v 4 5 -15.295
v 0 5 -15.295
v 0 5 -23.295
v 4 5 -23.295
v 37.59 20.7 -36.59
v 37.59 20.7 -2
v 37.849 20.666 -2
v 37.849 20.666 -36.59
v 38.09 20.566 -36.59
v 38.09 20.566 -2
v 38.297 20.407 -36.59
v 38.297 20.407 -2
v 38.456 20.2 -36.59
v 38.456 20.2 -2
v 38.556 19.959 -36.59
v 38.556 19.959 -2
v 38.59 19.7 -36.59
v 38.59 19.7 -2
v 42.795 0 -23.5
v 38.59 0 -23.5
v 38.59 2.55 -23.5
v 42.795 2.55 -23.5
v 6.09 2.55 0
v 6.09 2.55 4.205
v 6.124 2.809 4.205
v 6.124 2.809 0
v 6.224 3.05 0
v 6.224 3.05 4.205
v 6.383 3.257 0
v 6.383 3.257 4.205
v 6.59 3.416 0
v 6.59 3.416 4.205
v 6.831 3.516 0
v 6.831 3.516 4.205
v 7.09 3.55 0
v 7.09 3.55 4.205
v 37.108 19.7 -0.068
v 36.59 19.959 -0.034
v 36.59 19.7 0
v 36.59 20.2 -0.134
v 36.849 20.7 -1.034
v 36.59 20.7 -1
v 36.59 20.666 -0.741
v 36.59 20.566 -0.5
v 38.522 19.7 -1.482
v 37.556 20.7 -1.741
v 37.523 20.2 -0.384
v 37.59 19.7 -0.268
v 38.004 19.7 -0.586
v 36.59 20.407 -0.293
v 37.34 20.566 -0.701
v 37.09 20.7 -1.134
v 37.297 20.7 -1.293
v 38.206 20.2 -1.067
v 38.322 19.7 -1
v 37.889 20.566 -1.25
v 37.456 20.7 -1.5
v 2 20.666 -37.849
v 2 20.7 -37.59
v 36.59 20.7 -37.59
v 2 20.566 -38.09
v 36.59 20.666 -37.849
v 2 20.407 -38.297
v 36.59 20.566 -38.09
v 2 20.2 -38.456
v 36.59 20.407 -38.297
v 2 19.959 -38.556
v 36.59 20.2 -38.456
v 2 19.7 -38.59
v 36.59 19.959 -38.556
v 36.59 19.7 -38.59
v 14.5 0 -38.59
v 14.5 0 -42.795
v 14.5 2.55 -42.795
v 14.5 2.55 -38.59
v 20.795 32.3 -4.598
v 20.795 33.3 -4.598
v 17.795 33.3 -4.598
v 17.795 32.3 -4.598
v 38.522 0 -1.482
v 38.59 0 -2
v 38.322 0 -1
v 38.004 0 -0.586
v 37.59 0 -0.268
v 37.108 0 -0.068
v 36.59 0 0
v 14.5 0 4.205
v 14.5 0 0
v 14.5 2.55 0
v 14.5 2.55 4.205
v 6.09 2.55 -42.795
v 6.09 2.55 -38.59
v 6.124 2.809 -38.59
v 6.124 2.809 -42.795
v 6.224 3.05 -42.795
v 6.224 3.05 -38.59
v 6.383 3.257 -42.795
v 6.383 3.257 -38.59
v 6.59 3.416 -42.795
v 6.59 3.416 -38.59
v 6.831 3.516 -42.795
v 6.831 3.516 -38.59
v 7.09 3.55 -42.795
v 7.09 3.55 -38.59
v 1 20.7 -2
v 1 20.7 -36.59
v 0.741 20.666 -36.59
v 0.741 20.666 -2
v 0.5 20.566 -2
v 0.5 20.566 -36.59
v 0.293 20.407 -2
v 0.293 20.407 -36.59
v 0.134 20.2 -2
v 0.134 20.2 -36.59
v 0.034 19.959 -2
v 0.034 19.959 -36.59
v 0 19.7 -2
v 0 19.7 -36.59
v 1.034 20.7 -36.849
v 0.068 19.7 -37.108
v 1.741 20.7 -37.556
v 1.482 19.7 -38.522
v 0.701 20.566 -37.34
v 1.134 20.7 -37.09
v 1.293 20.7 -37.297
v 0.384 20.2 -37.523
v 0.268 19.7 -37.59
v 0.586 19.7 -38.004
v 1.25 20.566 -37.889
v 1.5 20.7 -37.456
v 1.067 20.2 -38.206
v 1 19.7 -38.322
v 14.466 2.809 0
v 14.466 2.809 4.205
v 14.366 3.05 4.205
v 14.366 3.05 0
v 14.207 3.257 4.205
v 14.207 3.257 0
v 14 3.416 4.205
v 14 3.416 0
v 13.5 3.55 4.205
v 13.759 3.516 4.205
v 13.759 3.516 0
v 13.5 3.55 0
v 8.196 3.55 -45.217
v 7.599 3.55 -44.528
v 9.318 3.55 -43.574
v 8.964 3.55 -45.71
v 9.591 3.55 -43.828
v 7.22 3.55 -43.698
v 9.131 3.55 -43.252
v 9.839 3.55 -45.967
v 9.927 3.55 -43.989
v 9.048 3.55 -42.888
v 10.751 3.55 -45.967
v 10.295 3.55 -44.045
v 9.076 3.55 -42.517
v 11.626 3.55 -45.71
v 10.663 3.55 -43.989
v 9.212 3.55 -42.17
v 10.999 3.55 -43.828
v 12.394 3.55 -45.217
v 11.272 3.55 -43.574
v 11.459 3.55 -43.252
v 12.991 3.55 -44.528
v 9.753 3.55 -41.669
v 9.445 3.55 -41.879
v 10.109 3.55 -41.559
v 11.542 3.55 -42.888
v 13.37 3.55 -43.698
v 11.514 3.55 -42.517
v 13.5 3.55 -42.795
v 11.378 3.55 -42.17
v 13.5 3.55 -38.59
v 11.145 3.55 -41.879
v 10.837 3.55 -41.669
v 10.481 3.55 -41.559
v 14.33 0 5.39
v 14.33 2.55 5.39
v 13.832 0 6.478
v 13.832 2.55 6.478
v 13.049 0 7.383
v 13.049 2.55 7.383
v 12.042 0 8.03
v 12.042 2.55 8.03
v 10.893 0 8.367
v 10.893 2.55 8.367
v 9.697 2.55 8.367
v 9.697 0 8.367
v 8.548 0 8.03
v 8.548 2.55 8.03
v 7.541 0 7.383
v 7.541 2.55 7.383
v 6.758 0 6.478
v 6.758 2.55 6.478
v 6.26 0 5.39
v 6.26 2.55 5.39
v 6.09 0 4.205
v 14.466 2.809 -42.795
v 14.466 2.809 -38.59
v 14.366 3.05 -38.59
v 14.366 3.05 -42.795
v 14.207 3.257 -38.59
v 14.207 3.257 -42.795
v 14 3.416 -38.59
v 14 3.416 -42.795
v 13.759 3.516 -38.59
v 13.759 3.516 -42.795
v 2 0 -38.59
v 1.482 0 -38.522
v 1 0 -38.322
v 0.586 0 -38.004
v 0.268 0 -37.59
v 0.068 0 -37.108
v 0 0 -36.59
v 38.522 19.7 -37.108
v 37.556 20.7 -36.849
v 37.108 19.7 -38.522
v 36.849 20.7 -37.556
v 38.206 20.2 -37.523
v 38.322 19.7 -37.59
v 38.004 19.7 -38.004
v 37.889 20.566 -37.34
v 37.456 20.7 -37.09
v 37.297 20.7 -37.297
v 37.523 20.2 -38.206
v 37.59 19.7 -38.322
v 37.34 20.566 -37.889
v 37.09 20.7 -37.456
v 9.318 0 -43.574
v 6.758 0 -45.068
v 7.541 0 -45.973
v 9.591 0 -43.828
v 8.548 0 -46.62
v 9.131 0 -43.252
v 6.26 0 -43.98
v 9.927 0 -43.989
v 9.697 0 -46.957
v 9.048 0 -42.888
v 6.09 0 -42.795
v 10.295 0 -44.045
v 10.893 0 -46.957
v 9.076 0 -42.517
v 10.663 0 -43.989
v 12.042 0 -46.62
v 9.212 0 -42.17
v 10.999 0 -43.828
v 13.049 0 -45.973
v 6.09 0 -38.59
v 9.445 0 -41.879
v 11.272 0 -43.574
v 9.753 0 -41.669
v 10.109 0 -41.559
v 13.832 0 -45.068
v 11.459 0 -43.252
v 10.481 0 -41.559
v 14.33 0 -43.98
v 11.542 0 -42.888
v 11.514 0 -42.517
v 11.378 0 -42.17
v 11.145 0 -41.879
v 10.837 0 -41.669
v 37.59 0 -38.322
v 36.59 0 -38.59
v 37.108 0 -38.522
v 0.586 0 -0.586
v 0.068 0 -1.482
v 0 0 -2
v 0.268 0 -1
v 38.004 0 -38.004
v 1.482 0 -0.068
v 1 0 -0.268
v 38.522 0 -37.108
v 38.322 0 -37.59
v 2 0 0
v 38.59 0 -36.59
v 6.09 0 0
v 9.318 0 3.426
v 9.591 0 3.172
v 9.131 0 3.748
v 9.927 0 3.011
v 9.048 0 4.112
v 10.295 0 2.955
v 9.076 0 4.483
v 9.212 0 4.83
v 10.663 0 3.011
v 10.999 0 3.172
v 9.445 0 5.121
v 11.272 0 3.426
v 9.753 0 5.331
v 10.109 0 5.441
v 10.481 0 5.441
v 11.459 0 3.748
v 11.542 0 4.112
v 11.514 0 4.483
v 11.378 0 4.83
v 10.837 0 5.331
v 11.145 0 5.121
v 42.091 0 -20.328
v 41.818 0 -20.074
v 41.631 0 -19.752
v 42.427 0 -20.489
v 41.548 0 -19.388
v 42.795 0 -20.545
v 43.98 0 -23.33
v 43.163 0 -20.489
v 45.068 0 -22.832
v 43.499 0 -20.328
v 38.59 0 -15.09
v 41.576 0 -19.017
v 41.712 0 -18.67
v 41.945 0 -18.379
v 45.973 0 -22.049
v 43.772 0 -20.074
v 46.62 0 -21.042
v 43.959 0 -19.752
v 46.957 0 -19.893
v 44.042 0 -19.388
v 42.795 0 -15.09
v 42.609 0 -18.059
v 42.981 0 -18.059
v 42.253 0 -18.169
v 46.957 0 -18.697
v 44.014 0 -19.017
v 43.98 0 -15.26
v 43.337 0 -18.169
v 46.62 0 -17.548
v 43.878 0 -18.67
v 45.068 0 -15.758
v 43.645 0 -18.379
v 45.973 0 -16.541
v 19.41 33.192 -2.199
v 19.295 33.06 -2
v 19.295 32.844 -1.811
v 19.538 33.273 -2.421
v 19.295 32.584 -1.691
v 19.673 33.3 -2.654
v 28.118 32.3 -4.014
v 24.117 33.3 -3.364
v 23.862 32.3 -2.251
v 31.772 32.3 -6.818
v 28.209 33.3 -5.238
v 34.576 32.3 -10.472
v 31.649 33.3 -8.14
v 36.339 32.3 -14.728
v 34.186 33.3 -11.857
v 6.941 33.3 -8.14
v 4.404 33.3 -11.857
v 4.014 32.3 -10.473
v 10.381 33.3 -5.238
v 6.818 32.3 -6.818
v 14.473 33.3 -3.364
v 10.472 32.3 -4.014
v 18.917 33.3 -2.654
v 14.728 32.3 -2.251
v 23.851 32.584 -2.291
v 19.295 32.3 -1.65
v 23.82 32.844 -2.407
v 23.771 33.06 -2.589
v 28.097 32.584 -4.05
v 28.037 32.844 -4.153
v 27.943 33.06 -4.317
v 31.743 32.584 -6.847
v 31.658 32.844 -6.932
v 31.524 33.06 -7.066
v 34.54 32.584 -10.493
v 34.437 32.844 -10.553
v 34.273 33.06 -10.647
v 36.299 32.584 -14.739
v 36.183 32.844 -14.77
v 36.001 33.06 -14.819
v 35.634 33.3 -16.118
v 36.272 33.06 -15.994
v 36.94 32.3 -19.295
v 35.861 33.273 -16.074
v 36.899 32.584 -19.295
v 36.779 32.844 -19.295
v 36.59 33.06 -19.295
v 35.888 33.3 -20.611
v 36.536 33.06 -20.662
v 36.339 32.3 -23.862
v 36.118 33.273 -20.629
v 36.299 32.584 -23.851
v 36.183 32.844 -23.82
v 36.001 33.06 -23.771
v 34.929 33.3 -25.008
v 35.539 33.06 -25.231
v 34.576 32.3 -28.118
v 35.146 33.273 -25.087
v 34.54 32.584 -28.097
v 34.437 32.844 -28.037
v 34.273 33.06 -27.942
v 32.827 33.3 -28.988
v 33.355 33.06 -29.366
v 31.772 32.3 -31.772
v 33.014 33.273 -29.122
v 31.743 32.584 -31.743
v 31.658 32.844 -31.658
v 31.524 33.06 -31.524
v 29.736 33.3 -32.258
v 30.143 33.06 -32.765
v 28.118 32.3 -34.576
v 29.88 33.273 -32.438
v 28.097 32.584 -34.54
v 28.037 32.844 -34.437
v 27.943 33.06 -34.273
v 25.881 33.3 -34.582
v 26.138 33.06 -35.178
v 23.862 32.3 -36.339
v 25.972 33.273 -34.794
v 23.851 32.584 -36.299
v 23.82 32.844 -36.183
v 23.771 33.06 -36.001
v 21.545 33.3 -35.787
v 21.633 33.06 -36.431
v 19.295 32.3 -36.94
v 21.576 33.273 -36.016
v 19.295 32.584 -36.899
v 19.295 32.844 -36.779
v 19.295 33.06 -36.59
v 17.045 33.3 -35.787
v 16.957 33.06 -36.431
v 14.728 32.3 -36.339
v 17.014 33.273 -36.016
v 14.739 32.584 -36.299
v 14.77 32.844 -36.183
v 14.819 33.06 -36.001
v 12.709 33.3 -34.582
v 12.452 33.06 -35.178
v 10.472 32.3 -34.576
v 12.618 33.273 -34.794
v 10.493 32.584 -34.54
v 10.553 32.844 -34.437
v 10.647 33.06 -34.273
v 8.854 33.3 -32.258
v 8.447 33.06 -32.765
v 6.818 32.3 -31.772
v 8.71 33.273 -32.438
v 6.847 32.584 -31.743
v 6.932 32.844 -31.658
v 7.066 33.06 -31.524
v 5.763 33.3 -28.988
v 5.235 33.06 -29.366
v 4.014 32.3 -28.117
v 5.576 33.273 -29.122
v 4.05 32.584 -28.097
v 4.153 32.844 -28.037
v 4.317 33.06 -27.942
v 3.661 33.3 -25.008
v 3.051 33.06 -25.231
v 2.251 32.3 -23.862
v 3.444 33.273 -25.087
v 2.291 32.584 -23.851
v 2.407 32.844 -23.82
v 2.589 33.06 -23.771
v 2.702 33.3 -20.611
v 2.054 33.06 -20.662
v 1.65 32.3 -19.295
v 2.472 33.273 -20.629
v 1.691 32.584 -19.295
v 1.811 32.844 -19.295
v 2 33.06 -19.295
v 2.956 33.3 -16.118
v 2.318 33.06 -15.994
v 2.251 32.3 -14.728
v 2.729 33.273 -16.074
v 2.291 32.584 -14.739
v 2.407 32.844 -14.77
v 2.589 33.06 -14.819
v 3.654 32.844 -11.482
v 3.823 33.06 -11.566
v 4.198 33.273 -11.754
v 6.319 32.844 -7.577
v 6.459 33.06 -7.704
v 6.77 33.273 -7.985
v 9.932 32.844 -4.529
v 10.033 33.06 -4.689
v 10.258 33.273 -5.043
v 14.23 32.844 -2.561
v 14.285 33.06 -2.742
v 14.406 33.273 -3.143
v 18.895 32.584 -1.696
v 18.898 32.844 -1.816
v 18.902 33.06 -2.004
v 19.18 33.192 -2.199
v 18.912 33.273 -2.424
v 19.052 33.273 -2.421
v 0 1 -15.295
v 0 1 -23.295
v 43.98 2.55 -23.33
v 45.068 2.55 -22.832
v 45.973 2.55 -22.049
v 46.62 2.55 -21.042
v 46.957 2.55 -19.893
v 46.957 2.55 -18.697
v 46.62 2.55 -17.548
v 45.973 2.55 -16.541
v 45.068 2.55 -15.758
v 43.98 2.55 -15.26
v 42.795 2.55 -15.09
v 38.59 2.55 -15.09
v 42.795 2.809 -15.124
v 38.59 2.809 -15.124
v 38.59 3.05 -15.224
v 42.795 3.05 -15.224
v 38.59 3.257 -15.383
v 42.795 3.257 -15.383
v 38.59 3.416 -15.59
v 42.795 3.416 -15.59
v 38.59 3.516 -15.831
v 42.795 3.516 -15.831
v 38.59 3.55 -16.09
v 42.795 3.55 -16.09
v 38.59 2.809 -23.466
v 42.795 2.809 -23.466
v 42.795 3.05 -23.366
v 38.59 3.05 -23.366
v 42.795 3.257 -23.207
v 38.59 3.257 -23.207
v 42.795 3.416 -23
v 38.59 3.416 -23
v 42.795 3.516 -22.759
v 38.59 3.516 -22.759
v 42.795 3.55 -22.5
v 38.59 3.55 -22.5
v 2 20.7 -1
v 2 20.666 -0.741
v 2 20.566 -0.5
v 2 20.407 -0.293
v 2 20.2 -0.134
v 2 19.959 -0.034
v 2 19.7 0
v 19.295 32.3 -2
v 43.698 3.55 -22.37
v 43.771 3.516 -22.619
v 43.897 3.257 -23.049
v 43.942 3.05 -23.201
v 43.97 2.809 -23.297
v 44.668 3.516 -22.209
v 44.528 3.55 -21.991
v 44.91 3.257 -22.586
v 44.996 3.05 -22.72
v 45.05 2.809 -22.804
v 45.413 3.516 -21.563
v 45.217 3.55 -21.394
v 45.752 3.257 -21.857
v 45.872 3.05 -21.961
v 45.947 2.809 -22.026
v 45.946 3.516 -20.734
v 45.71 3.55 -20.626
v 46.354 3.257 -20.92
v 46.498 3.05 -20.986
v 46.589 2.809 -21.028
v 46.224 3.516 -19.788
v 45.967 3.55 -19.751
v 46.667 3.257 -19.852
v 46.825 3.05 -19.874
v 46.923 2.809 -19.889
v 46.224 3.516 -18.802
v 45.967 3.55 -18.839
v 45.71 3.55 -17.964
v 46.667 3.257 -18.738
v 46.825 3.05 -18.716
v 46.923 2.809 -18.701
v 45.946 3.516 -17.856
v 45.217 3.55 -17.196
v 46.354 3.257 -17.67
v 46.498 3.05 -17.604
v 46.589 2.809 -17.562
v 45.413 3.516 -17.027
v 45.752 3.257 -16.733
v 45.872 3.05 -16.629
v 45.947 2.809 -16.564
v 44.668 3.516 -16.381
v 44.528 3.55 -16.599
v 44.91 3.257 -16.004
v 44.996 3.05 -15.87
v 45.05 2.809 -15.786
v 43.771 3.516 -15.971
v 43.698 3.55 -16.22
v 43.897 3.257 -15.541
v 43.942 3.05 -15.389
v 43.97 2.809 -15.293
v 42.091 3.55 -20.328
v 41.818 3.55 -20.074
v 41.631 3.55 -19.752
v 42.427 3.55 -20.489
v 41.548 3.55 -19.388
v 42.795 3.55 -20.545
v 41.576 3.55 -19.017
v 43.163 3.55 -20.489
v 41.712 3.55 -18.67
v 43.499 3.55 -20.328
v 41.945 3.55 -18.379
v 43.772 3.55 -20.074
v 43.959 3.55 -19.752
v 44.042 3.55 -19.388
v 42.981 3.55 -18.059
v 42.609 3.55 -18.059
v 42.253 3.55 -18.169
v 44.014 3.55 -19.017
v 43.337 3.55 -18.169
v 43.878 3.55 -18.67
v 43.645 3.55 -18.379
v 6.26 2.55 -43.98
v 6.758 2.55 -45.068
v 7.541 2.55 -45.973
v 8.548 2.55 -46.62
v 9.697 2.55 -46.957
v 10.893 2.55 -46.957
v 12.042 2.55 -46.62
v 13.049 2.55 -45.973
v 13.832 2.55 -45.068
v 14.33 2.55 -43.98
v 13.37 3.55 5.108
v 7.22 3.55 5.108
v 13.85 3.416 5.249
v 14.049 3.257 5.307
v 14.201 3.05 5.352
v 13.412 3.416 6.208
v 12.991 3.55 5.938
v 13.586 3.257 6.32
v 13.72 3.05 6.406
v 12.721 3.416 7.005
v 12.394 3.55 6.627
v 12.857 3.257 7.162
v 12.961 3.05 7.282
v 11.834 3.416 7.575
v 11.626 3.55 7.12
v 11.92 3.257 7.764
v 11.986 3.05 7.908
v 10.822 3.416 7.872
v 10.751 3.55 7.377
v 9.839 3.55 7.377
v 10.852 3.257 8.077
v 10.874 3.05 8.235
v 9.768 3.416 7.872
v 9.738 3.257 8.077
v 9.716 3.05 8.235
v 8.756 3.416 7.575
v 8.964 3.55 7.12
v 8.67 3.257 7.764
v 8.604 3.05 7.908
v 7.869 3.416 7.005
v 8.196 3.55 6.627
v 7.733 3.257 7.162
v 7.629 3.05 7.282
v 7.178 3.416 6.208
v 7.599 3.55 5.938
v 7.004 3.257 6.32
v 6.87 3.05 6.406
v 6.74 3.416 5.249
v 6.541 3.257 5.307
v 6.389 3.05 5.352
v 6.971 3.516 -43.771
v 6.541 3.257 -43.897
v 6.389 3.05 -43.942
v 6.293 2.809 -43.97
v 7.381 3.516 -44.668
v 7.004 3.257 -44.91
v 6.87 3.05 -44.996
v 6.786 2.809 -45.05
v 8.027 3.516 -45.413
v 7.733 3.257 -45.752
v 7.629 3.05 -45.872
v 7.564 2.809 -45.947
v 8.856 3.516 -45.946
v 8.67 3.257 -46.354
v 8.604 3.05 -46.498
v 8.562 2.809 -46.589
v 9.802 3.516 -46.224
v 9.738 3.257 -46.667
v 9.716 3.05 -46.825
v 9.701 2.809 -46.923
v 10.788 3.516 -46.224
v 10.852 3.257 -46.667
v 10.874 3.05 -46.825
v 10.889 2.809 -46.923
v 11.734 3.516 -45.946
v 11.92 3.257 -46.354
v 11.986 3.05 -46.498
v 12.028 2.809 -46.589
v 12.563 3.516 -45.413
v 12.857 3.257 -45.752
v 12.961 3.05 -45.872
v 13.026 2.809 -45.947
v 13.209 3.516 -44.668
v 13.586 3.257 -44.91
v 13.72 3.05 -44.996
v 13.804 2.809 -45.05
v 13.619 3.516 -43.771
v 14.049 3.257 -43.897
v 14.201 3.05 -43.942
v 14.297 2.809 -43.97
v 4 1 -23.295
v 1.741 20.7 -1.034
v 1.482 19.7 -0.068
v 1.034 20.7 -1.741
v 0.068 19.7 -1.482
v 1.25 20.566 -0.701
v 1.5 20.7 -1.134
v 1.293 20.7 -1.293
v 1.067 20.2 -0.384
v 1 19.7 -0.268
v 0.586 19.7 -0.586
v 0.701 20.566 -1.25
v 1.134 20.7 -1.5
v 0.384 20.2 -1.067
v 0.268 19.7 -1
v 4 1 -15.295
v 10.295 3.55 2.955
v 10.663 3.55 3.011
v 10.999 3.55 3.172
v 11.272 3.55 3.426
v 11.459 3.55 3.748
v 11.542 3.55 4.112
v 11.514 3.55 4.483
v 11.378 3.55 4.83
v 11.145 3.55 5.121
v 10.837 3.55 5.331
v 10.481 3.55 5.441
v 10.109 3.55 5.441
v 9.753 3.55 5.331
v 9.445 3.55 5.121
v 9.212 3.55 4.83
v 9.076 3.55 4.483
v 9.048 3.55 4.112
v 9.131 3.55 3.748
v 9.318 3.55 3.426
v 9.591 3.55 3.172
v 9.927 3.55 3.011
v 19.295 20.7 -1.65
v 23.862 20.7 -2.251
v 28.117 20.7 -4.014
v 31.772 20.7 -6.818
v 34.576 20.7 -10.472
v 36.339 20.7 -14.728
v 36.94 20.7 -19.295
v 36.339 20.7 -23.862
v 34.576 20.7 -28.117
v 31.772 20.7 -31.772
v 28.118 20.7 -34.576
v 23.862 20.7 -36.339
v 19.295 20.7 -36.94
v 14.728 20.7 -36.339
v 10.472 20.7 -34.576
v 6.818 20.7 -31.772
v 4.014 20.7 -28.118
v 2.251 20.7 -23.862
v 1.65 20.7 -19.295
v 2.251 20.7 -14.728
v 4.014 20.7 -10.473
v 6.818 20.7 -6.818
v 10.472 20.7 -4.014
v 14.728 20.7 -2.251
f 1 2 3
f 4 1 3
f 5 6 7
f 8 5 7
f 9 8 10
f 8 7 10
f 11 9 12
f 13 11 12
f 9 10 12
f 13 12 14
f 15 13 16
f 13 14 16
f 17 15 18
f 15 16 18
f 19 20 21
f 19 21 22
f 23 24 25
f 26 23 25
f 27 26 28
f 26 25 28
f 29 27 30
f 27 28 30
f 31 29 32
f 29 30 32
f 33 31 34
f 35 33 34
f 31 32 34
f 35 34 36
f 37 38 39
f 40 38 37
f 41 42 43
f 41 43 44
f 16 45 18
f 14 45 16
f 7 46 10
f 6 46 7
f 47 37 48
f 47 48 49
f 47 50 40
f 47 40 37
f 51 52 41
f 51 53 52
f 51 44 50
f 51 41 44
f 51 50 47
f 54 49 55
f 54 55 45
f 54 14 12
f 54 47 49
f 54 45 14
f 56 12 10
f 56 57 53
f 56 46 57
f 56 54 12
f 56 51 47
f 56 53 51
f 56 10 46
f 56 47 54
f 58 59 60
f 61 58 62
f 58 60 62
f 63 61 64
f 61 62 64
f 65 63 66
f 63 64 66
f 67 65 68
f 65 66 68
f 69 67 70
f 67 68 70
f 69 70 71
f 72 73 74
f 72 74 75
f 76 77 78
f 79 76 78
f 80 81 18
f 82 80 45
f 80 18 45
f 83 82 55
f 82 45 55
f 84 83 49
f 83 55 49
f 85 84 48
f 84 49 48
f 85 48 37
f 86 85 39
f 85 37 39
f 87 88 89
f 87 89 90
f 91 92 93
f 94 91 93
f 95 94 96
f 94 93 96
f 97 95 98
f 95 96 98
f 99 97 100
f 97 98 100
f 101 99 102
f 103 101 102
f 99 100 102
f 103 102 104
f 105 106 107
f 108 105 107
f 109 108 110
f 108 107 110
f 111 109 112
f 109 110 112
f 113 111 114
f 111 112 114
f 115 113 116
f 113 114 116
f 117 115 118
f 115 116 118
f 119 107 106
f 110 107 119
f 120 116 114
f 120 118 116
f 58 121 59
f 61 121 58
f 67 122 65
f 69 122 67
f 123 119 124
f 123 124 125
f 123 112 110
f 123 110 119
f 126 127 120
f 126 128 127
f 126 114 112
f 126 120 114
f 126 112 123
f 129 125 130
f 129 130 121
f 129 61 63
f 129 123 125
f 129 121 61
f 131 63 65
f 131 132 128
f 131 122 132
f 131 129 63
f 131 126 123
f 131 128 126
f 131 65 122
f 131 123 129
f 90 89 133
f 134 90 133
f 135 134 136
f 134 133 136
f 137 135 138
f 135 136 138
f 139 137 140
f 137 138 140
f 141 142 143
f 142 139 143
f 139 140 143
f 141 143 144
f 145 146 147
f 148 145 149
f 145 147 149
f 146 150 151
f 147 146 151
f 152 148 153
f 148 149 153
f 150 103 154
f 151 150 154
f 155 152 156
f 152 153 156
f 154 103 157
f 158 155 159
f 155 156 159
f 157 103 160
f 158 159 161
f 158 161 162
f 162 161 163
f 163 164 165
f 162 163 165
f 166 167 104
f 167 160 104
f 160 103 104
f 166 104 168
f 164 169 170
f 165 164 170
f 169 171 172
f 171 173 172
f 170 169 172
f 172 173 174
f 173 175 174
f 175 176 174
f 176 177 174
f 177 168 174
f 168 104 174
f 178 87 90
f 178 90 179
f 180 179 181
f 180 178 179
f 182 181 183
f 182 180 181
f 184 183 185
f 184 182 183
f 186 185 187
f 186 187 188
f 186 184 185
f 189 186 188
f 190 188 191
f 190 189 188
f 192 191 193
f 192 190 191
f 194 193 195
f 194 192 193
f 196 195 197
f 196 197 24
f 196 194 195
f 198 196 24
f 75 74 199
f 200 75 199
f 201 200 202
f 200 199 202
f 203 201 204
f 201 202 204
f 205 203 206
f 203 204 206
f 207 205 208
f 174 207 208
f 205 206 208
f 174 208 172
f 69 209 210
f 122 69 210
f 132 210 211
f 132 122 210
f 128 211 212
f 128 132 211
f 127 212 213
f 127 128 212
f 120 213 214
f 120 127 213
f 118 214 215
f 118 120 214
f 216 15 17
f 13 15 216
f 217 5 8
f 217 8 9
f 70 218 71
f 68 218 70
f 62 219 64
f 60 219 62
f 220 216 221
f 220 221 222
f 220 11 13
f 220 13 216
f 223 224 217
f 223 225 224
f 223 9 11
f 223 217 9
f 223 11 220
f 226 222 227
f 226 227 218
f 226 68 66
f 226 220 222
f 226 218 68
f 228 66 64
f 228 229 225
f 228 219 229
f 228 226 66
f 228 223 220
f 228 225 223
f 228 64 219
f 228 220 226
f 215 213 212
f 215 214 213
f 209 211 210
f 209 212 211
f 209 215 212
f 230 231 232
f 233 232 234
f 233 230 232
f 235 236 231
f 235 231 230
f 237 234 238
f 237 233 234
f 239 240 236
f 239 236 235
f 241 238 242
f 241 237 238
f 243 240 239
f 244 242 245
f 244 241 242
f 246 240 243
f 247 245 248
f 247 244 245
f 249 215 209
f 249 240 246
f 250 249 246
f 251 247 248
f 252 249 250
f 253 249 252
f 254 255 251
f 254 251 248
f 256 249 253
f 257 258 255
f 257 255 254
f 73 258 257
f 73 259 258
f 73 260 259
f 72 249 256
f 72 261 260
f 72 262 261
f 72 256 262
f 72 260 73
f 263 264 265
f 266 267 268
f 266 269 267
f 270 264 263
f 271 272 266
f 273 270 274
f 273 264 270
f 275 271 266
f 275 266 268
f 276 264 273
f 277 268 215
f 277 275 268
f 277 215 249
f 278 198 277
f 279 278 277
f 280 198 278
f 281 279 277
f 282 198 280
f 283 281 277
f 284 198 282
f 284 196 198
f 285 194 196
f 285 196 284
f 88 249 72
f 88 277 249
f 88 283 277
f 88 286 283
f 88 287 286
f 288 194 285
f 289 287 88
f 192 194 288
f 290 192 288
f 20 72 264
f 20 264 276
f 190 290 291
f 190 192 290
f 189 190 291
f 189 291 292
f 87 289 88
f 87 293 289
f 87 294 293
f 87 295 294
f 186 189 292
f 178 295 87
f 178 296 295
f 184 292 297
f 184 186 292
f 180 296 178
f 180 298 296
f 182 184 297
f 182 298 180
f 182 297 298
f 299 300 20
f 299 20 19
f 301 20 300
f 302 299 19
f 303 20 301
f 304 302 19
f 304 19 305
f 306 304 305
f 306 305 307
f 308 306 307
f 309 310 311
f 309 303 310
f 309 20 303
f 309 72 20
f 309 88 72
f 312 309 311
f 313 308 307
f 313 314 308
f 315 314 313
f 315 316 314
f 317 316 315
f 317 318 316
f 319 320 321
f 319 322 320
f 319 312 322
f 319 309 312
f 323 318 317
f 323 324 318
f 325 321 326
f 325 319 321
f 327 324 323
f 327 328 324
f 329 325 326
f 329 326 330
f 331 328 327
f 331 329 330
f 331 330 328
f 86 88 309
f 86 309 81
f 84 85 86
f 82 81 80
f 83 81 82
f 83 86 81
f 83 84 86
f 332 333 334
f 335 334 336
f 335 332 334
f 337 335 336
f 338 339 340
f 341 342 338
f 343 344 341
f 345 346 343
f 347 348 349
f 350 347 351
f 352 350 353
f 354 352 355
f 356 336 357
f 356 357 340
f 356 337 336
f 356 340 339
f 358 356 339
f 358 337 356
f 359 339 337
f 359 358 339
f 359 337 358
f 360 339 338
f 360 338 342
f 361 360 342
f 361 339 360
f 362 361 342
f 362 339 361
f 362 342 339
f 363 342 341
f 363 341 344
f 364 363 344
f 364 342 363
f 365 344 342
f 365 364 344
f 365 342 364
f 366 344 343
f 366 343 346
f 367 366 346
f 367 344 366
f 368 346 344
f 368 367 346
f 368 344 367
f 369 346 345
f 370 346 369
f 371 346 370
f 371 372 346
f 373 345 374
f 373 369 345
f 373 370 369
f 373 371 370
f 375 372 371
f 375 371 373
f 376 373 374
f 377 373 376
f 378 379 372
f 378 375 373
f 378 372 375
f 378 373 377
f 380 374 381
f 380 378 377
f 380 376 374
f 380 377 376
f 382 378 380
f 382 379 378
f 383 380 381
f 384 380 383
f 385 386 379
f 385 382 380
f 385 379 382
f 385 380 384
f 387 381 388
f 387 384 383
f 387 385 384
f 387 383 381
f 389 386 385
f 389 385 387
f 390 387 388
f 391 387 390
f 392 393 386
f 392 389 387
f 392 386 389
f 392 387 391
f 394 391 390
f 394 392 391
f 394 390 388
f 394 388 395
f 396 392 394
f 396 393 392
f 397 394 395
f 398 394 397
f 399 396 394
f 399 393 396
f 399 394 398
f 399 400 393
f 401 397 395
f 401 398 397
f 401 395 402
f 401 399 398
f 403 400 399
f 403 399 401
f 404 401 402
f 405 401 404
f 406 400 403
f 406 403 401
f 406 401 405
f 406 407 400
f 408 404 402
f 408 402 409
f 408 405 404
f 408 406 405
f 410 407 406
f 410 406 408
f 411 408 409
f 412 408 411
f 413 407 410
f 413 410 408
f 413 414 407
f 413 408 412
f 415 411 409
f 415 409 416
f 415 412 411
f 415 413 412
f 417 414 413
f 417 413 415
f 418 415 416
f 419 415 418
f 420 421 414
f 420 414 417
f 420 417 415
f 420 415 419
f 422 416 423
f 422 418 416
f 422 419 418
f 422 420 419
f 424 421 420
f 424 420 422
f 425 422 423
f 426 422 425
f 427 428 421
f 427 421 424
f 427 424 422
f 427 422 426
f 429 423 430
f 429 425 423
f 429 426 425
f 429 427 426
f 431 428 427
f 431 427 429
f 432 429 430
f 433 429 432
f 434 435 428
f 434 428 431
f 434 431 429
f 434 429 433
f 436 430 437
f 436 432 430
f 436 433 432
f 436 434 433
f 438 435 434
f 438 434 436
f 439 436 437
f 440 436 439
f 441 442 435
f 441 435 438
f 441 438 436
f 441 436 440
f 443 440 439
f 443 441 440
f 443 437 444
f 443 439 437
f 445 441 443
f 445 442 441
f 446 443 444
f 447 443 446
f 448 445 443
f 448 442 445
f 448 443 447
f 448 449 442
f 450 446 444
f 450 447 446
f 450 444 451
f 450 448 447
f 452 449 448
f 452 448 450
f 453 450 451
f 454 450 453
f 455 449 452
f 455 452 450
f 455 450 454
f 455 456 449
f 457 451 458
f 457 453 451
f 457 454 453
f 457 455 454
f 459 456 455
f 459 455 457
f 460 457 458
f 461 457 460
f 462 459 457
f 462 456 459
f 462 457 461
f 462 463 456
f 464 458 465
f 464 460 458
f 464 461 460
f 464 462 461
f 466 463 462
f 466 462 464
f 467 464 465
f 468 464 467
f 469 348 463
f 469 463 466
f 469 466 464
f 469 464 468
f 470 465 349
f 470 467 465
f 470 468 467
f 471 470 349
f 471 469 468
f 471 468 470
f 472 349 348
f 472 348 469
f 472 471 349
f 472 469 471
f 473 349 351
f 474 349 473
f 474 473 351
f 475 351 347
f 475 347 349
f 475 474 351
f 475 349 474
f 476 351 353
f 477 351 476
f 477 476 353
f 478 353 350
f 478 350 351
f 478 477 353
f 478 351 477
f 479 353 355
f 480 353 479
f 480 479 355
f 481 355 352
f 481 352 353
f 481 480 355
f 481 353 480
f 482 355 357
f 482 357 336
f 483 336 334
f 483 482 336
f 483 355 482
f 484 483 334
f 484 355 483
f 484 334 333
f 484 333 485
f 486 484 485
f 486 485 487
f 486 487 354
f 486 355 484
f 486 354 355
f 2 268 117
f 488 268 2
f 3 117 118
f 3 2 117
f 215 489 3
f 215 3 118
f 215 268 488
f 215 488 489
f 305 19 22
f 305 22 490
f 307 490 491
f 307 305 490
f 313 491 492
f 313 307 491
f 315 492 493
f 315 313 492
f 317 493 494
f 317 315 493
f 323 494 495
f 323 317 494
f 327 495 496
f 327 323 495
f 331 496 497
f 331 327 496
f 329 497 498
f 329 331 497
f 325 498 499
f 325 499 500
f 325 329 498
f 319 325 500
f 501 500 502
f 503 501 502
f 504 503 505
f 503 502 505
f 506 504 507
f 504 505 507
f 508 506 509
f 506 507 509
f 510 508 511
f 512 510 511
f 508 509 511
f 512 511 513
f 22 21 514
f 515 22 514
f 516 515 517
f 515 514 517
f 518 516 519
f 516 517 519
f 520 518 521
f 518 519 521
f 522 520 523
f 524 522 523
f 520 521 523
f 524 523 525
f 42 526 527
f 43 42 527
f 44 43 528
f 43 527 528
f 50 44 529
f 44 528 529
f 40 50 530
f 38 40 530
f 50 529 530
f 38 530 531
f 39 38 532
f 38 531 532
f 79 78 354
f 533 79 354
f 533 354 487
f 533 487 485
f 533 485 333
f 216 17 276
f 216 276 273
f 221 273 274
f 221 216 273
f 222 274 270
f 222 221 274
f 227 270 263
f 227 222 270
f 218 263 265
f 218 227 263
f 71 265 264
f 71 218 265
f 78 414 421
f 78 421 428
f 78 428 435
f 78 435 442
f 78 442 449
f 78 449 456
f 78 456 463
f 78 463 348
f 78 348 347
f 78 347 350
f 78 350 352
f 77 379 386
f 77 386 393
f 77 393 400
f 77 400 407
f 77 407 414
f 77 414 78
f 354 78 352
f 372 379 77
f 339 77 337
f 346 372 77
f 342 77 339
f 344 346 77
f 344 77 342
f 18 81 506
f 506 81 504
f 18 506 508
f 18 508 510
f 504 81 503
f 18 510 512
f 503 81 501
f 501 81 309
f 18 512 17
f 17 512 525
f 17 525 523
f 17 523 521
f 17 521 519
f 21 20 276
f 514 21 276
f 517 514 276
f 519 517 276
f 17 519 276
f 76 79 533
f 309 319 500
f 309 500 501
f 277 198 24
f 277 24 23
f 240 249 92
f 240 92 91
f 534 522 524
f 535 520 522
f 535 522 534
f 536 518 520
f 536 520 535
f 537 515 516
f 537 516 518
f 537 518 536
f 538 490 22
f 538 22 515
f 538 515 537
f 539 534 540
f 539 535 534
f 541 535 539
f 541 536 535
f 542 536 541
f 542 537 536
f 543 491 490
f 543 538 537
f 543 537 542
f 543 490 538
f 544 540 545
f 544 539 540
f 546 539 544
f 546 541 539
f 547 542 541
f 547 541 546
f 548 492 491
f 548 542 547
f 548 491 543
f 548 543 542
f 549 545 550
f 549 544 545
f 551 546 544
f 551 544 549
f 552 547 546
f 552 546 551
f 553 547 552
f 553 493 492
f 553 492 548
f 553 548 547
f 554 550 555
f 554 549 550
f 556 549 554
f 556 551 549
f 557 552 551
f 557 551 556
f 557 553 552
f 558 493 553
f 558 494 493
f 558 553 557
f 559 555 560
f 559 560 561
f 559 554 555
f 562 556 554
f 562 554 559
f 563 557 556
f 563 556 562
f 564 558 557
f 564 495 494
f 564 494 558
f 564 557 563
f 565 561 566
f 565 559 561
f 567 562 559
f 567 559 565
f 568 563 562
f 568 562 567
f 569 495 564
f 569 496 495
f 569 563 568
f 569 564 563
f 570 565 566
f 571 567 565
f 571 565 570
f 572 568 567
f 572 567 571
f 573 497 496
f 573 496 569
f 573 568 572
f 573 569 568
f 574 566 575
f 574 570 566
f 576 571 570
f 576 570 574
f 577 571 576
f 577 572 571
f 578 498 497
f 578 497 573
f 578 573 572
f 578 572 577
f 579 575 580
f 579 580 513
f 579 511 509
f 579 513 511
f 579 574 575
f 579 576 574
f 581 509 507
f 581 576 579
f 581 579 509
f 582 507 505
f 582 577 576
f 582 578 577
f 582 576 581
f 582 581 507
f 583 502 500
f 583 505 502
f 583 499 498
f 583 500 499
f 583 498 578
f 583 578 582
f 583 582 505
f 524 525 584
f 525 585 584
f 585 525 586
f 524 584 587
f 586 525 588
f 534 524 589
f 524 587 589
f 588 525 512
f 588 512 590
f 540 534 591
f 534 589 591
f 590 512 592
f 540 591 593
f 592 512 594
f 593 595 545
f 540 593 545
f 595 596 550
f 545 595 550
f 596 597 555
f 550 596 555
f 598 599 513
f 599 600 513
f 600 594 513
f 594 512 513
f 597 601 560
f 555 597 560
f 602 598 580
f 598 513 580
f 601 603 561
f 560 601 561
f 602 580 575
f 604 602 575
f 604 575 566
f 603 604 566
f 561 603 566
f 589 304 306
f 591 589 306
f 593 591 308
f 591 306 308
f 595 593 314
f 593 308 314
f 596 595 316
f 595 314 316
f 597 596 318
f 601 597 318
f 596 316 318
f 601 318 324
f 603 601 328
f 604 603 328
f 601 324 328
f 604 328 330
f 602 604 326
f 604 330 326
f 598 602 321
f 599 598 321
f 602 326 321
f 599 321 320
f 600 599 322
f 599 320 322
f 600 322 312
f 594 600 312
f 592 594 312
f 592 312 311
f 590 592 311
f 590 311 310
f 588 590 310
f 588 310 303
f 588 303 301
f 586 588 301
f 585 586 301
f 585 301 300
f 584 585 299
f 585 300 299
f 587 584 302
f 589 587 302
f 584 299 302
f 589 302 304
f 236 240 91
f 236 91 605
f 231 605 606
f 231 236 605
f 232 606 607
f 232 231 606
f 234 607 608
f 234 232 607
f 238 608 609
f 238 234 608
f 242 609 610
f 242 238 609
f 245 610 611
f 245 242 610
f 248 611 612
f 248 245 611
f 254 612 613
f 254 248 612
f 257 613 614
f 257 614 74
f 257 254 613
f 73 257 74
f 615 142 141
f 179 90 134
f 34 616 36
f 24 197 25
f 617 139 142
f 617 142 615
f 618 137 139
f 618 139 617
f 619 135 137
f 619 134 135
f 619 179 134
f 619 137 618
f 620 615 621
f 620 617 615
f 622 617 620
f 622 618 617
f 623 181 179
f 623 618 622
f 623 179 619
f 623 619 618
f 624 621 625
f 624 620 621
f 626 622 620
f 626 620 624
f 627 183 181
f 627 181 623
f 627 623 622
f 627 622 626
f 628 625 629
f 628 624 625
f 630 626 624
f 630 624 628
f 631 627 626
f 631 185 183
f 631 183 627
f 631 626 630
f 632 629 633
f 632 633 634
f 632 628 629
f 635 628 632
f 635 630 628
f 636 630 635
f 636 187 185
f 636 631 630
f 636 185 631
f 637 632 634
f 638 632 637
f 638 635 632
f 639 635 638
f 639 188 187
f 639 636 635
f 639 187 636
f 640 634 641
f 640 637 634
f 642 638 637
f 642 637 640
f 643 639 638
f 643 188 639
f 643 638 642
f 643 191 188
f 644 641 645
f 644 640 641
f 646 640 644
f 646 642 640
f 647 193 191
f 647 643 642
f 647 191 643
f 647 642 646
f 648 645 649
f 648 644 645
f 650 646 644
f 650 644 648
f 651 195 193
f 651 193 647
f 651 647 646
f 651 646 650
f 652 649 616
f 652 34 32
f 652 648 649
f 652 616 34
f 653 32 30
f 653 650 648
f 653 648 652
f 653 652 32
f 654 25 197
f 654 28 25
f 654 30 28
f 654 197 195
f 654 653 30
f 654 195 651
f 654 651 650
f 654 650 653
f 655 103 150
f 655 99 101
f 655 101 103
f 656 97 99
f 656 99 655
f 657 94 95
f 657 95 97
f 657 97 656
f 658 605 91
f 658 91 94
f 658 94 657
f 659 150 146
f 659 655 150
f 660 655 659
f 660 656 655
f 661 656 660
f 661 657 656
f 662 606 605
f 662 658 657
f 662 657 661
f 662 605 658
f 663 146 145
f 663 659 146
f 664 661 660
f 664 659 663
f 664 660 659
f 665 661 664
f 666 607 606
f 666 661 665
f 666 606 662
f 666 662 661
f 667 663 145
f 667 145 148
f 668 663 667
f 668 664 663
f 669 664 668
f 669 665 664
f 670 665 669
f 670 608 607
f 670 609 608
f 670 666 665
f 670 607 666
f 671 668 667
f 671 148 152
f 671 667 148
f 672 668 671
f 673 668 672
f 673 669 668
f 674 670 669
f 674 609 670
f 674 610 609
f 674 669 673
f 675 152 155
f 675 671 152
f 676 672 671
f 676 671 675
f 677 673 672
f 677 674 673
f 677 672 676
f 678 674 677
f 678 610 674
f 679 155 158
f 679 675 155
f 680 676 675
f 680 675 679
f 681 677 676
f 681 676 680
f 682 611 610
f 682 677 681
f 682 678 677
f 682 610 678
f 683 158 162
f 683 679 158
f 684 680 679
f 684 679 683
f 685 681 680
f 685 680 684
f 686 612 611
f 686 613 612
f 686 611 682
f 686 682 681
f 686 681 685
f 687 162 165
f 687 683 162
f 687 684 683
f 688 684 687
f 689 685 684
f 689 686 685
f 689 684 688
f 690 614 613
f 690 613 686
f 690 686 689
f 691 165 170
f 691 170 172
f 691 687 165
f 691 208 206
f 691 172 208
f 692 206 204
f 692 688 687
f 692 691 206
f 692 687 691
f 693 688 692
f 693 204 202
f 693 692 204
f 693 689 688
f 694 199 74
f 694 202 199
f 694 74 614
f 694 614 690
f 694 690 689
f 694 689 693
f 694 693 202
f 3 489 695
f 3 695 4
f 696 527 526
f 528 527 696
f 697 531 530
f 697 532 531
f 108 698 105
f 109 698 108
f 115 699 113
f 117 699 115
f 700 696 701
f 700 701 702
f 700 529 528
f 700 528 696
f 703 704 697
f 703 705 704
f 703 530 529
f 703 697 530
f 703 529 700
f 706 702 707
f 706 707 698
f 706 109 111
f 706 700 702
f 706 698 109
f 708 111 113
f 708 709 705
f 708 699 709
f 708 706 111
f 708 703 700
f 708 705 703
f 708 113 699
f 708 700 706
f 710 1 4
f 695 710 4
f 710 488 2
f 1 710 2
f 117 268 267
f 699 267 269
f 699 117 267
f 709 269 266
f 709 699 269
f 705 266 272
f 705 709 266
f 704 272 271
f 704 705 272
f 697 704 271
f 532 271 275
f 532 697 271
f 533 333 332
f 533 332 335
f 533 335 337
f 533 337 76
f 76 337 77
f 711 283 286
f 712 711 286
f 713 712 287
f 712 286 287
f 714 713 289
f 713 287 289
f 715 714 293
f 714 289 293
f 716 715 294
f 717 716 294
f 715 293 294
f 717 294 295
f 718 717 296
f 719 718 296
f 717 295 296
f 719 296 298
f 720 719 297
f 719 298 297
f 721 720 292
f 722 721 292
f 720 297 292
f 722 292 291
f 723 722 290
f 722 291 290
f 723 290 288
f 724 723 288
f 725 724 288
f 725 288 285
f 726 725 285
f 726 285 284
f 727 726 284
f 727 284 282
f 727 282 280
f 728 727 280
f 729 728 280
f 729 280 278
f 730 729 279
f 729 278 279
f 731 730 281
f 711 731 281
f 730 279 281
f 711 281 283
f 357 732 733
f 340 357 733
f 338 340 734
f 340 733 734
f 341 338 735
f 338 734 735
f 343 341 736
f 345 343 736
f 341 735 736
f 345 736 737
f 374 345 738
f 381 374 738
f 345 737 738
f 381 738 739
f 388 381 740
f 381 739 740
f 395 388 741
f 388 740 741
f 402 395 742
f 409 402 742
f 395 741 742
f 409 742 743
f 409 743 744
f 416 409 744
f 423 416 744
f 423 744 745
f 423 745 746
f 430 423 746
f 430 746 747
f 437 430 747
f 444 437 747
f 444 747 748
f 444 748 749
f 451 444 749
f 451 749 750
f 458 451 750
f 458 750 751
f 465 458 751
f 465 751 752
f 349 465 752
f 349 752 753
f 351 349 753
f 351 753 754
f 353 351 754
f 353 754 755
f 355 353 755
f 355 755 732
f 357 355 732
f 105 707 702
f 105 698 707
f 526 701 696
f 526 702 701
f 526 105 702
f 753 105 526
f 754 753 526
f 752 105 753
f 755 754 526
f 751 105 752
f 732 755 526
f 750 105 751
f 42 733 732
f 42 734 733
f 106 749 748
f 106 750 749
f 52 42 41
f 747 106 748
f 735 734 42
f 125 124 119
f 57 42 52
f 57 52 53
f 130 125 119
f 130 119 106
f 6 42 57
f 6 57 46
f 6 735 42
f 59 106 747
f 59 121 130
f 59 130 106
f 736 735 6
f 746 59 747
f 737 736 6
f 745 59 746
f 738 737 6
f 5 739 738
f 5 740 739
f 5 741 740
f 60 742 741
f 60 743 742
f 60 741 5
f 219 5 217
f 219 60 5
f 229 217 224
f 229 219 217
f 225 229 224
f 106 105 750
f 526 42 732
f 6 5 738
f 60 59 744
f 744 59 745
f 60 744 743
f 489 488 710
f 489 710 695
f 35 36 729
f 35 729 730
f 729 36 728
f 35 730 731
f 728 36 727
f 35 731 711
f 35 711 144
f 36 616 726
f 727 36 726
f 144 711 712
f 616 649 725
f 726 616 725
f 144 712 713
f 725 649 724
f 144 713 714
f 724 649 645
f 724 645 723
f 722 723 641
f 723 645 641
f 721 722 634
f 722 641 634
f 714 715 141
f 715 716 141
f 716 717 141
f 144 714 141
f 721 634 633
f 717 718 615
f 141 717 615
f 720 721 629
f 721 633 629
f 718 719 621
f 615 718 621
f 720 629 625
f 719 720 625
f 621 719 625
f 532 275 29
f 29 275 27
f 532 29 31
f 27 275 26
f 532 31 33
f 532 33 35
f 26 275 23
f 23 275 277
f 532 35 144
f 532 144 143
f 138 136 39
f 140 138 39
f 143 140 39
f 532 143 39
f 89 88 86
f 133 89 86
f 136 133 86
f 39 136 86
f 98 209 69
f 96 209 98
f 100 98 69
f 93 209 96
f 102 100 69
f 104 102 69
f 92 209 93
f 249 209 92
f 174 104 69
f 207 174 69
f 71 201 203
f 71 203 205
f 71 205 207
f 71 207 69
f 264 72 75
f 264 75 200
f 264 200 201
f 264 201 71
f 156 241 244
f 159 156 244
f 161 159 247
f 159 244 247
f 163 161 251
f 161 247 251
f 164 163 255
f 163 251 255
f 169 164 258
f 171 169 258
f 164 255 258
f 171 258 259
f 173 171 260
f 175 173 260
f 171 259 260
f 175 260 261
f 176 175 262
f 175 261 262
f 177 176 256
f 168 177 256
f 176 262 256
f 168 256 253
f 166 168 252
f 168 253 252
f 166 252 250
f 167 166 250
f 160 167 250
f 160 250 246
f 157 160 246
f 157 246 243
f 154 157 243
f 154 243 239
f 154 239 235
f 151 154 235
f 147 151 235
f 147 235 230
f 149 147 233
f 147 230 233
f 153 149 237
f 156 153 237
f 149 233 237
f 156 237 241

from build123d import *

# Parameters (mm, degrees)
SKETCH1_W           = 38.59
SKETCH1_H           = 38.59
BOSS_EXTRUDE1_DEPTH = 20.7
SKETCH2_R           = 17.645
BOSS_EXTRUDE2_DEPTH = 12.6
CUT_EXTRUDE1_DEPTH  = 1
SKETCH6_W           = 8
SKETCH6_H           = 4
CUT_EXTRUDE2_DEPTH  = 4
SKETCH8_R           = 4.205
SKETCH8_R_2         = 1.25
BOSS_EXTRUDE3_DEPTH = 3.55
FILLET2_R           = 2
FILLET1_R           = 1


with BuildPart() as part:
    # Sketch1 → Boss-Extrude1 (new body)
    with BuildSketch(Plane(origin=(0, 0, 0), x_dir=(1, 0, 0), z_dir=(0, 1, 0))):
        with Locations((19.295, 19.295)):
            Rectangle(SKETCH1_W, SKETCH1_H)
    extrude(amount=BOSS_EXTRUDE1_DEPTH)

    # Sketch2 → Boss-Extrude2 (add)
    with BuildSketch(Plane(origin=(0, 20.7, 0), x_dir=(1, 0, 0), z_dir=(0, 1, 0))):
        with Locations(Location((19.295, 19.295, 0), (0, 0, 270))):
            Circle(SKETCH2_R)
    extrude(amount=BOSS_EXTRUDE2_DEPTH)

    # Sketch3 → Cut-Extrude1 (cut)
    with BuildSketch(Plane(origin=(0, 33.3, 0), x_dir=(1, 0, 0), z_dir=(0, 1, 0))):
        Polygon((17.795, 4.598076211), (19.295, 2), (20.795, 4.598076211), align=None)
    extrude(amount=-CUT_EXTRUDE1_DEPTH, mode=Mode.SUBTRACT)

    # Sketch6 → Cut-Extrude2 (cut)
    with BuildSketch(Plane(origin=(0, 0, 0), x_dir=(0, 0, -1), z_dir=(1, 0, 0))):
        with Locations((19.295, 3)):
            Rectangle(SKETCH6_W, SKETCH6_H)
    extrude(amount=CUT_EXTRUDE2_DEPTH, mode=Mode.SUBTRACT)

    # Sketch8 → Boss-Extrude3 (add)
    # profile 1 of 9: a face of its own
    with BuildSketch(Plane.XZ):
        with BuildLine():
            ThreePointArc((10.294999977, 0), (7.321615977, 1.231615993), (6.09, 4.205))
            Line((6.09, 4.205), (6.09, 0))
            Line((6.09, 0), (10.294999977, 0))
        make_face()
    # profile 2 of 9: a face of its own
    with BuildSketch(Plane.XZ):
        with BuildLine():
            Line((14.5, 0), (14.5, 4.205))
            ThreePointArc((14.5, 4.205), (13.268384007, 1.231615977), (10.294999977, 0))
            Line((10.294999977, 0), (14.5, 0))
        make_face()
    # profile 3 of 9: a face of its own
    with BuildSketch(Plane.XZ):
        with Locations((10.295, 4.205)):
            Circle(SKETCH8_R)
        with Locations(Location((10.295, 4.205, 0), (0, 0, 270))):
            Circle(SKETCH8_R_2, mode=Mode.SUBTRACT)
    # profile 4 of 9: a face of its own
    with BuildSketch(Plane.XZ):
        with BuildLine():
            Line((42.795, -15.09), (38.59, -15.09))
            Line((38.59, -15.09), (38.59, -19.295))
            ThreePointArc((38.59, -19.295), (39.821615985, -16.321615985), (42.795, -15.09))
        make_face()
    # profile 5 of 9: a face of its own
    with BuildSketch(Plane.XZ):
        with BuildLine():
            ThreePointArc((42.795, -23.5), (39.821615985, -22.268384015), (38.59, -19.295))
            Line((38.59, -19.295), (38.59, -23.5))
            Line((38.59, -23.5), (42.795, -23.5))
        make_face()
    # profile 6 of 9: a face of its own
    with BuildSketch(Plane.XZ):
        with Locations((42.795, -19.295)):
            Circle(SKETCH8_R)
        with Locations(Location((42.795, -19.295, 0), (0, 0, 270))):
            Circle(SKETCH8_R_2, mode=Mode.SUBTRACT)
    # profile 7 of 9: a face of its own
    with BuildSketch(Plane.XZ):
        with BuildLine():
            ThreePointArc((6.09, -42.795), (7.321615985, -39.821615985), (10.295, -38.59))
            Line((10.295, -38.59), (6.09, -38.59))
            Line((6.09, -38.59), (6.09, -42.795))
        make_face()
    # profile 8 of 9: a face of its own
    with BuildSketch(Plane.XZ):
        with Locations((10.295, -42.795)):
            Circle(SKETCH8_R)
        with Locations(Location((10.295, -42.795, 0), (0, 0, 270))):
            Circle(SKETCH8_R_2, mode=Mode.SUBTRACT)
    # profile 9 of 9: a face of its own
    with BuildSketch(Plane.XZ):
        with BuildLine():
            Line((14.5, -42.795), (14.5, -38.59))
            Line((14.5, -38.59), (10.295, -38.59))
            ThreePointArc((10.295, -38.59), (13.268384015, -39.821615985), (14.5, -42.795))
        make_face()
    extrude(amount=-BOSS_EXTRUDE3_DEPTH)

    # Fillet2
    fillet2_edges = [part.edges().sort_by_distance(p)[0] for p in [
        (0, 10.35, -38.59),
        (38.59, 10.35, -38.59),
        (38.59, 10.35, 0),
        (0, 10.35, 0),
    ]]
    fillet(fillet2_edges, radius=FILLET2_R)

    # Fillet1
    # the kernel refuses this fillet: 1 mm, written as the material it takes off along each edge
    with BuildSketch(Plane(origin=(2, 20.7, -36.59), x_dir=(-1, 0, 0), z_dir=(0, 0, 1))) as fillet1_piece_1:
        with BuildLine():
            CenterArc((2 - FILLET1_R, FILLET1_R), FILLET1_R, 270, 90)
            Line((2, FILLET1_R), (2, 0))
            Line((2, 0), (2 - FILLET1_R, 0))
        make_face()
    revolve(axis=Axis((2, 20.7, -36.59), (0, -1, 0)), revolution_arc=90, mode=Mode.SUBTRACT)
    with BuildSketch(Plane(origin=(19.295, 33.3, -19.295), x_dir=(0, 0, 1), z_dir=(-1, 0, 0))) as fillet1_piece_2:
        with BuildLine():
            CenterArc((17.645 - FILLET1_R, -FILLET1_R), FILLET1_R, 0, 90)
            Line((17.645 - FILLET1_R, 0), (17.645, 0))
            Line((17.645, 0), (17.645, -FILLET1_R))
        make_face()
    revolve(axis=Axis((19.295, 33.3, -19.295), (0, 1, 0)), mode=Mode.SUBTRACT)
    with BuildSketch(Plane(origin=(6.09, 3.55, 4.205), x_dir=(0, -1, 0), z_dir=(0, 0, -1)), Plane(origin=(42.795, 3.55, -15.09), x_dir=(0, -1, 0), z_dir=(-1, 0, 0)), Plane(origin=(38.59, 3.55, -23.5), x_dir=(0, -1, 0), z_dir=(1, 0, 0)), Plane(origin=(6.09, 3.55, -38.59), x_dir=(0, -1, 0), z_dir=(0, 0, -1)), Plane(origin=(14.5, 3.55, -42.795), x_dir=(0, -1, 0), z_dir=(0, 0, 1))) as fillet1_piece_3:
        with BuildLine():
            CenterArc((FILLET1_R, -FILLET1_R), FILLET1_R, 90, 90)
            Line((0, -FILLET1_R), (0, 0))
            Line((0, 0), (FILLET1_R, 0))
        make_face()
    extrude(amount=4.205, mode=Mode.SUBTRACT)
    with BuildSketch(Plane(origin=(10.295, 3.55, 4.205), x_dir=(1, 0, 0), z_dir=(0, 0, -1))) as fillet1_piece_4:
        with BuildLine():
            CenterArc((4.205 - FILLET1_R, FILLET1_R), FILLET1_R, 270, 90)
            Line((4.205, FILLET1_R), (4.205, 0))
            Line((4.205, 0), (4.205 - FILLET1_R, 0))
        make_face()
    revolve(axis=Axis((10.295, 3.55, 4.205), (0, -1, 0)), revolution_arc=180, mode=Mode.SUBTRACT)
    with BuildSketch(Plane(origin=(14.5, 3.55, 0), x_dir=(-1, 0, 0), z_dir=(0, 0, 1))) as fillet1_piece_5:
        with BuildLine():
            CenterArc((FILLET1_R, FILLET1_R), FILLET1_R, 180, 90)
            Line((0, FILLET1_R), (0, 0))
            Line((0, 0), (FILLET1_R, 0))
        make_face()
    extrude(amount=4.205, mode=Mode.SUBTRACT)
    with BuildSketch(Plane(origin=(42.795, 3.55, -19.295), x_dir=(0, 0, -1), z_dir=(-1, 0, 0))) as fillet1_piece_6:
        with BuildLine():
            CenterArc((4.205 - FILLET1_R, FILLET1_R), FILLET1_R, 270, 90)
            Line((4.205 - FILLET1_R, 0), (4.205, 0))
            Line((4.205, 0), (4.205, FILLET1_R))
        make_face()
    revolve(axis=Axis((42.795, 3.55, -19.295), (0, -1, 0)), revolution_arc=180, mode=Mode.SUBTRACT)
    with BuildSketch(Plane(origin=(10.295, 3.55, -42.795), x_dir=(-1, 0, 0), z_dir=(0, 0, 1))) as fillet1_piece_7:
        with BuildLine():
            CenterArc((4.205 - FILLET1_R, FILLET1_R), FILLET1_R, 270, 90)
            Line((4.205 - FILLET1_R, 0), (4.205, 0))
            Line((4.205, 0), (4.205, FILLET1_R))
        make_face()
    revolve(axis=Axis((10.295, 3.55, -42.795), (0, -1, 0)), revolution_arc=180, mode=Mode.SUBTRACT)
    with BuildSketch(Plane(origin=(0, 20.7, -36.59), x_dir=(1, 0, 0), z_dir=(0, 0, 1)), Plane(origin=(36.59, 20.7, -38.59), x_dir=(0, 0, 1), z_dir=(-1, 0, 0)), Plane(origin=(38.59, 20.7, -2), x_dir=(-1, 0, 0), z_dir=(0, 0, -1))) as fillet1_piece_8:
        with BuildLine():
            CenterArc((FILLET1_R, -FILLET1_R), FILLET1_R, 90, 90)
            Line((0, -FILLET1_R), (0, 0))
            Line((0, 0), (FILLET1_R, 0))
        make_face()
    extrude(amount=34.59, mode=Mode.SUBTRACT)
    with BuildSketch(Plane(origin=(2, 20.7, 0), x_dir=(0, -1, 0), z_dir=(1, 0, 0))) as fillet1_piece_9:
        with BuildLine():
            CenterArc((FILLET1_R, FILLET1_R), FILLET1_R, 180, 90)
            Line((0, FILLET1_R), (0, 0))
            Line((0, 0), (FILLET1_R, 0))
        make_face()
    extrude(amount=34.59, mode=Mode.SUBTRACT)
    with BuildSketch(Plane(origin=(2, 20.7, -2), x_dir=(0, 0, 1), z_dir=(1, 0, 0))) as fillet1_piece_10:
        with BuildLine():
            CenterArc((2 - FILLET1_R, FILLET1_R), FILLET1_R, 270, 90)
            Line((2 - FILLET1_R, 0), (2, 0))
            Line((2, 0), (2, FILLET1_R))
        make_face()
    revolve(axis=Axis((2, 20.7, -2), (0, -1, 0)), revolution_arc=90, mode=Mode.SUBTRACT)
    with BuildSketch(Plane(origin=(36.59, 20.7, -2), x_dir=(0, 0, 1), z_dir=(-1, 0, 0))) as fillet1_piece_11:
        with BuildLine():
            CenterArc((2 - FILLET1_R, -FILLET1_R), FILLET1_R, 0, 90)
            Line((2, -FILLET1_R), (2, 0))
            Line((2, 0), (2 - FILLET1_R, 0))
        make_face()
    revolve(axis=Axis((36.59, 20.7, -2), (0, 1, 0)), revolution_arc=90, mode=Mode.SUBTRACT)
    with BuildSketch(Plane(origin=(36.59, 20.7, -36.59), x_dir=(1, 0, 0), z_dir=(0, 0, 1))) as fillet1_piece_12:
        with BuildLine():
            CenterArc((2 - FILLET1_R, -FILLET1_R), FILLET1_R, 0, 90)
            Line((2, -FILLET1_R), (2, 0))
            Line((2, 0), (2 - FILLET1_R, 0))
        make_face()
    revolve(axis=Axis((36.59, 20.7, -36.59), (0, 1, 0)), revolution_arc=90, mode=Mode.SUBTRACT)


solid = part.part
